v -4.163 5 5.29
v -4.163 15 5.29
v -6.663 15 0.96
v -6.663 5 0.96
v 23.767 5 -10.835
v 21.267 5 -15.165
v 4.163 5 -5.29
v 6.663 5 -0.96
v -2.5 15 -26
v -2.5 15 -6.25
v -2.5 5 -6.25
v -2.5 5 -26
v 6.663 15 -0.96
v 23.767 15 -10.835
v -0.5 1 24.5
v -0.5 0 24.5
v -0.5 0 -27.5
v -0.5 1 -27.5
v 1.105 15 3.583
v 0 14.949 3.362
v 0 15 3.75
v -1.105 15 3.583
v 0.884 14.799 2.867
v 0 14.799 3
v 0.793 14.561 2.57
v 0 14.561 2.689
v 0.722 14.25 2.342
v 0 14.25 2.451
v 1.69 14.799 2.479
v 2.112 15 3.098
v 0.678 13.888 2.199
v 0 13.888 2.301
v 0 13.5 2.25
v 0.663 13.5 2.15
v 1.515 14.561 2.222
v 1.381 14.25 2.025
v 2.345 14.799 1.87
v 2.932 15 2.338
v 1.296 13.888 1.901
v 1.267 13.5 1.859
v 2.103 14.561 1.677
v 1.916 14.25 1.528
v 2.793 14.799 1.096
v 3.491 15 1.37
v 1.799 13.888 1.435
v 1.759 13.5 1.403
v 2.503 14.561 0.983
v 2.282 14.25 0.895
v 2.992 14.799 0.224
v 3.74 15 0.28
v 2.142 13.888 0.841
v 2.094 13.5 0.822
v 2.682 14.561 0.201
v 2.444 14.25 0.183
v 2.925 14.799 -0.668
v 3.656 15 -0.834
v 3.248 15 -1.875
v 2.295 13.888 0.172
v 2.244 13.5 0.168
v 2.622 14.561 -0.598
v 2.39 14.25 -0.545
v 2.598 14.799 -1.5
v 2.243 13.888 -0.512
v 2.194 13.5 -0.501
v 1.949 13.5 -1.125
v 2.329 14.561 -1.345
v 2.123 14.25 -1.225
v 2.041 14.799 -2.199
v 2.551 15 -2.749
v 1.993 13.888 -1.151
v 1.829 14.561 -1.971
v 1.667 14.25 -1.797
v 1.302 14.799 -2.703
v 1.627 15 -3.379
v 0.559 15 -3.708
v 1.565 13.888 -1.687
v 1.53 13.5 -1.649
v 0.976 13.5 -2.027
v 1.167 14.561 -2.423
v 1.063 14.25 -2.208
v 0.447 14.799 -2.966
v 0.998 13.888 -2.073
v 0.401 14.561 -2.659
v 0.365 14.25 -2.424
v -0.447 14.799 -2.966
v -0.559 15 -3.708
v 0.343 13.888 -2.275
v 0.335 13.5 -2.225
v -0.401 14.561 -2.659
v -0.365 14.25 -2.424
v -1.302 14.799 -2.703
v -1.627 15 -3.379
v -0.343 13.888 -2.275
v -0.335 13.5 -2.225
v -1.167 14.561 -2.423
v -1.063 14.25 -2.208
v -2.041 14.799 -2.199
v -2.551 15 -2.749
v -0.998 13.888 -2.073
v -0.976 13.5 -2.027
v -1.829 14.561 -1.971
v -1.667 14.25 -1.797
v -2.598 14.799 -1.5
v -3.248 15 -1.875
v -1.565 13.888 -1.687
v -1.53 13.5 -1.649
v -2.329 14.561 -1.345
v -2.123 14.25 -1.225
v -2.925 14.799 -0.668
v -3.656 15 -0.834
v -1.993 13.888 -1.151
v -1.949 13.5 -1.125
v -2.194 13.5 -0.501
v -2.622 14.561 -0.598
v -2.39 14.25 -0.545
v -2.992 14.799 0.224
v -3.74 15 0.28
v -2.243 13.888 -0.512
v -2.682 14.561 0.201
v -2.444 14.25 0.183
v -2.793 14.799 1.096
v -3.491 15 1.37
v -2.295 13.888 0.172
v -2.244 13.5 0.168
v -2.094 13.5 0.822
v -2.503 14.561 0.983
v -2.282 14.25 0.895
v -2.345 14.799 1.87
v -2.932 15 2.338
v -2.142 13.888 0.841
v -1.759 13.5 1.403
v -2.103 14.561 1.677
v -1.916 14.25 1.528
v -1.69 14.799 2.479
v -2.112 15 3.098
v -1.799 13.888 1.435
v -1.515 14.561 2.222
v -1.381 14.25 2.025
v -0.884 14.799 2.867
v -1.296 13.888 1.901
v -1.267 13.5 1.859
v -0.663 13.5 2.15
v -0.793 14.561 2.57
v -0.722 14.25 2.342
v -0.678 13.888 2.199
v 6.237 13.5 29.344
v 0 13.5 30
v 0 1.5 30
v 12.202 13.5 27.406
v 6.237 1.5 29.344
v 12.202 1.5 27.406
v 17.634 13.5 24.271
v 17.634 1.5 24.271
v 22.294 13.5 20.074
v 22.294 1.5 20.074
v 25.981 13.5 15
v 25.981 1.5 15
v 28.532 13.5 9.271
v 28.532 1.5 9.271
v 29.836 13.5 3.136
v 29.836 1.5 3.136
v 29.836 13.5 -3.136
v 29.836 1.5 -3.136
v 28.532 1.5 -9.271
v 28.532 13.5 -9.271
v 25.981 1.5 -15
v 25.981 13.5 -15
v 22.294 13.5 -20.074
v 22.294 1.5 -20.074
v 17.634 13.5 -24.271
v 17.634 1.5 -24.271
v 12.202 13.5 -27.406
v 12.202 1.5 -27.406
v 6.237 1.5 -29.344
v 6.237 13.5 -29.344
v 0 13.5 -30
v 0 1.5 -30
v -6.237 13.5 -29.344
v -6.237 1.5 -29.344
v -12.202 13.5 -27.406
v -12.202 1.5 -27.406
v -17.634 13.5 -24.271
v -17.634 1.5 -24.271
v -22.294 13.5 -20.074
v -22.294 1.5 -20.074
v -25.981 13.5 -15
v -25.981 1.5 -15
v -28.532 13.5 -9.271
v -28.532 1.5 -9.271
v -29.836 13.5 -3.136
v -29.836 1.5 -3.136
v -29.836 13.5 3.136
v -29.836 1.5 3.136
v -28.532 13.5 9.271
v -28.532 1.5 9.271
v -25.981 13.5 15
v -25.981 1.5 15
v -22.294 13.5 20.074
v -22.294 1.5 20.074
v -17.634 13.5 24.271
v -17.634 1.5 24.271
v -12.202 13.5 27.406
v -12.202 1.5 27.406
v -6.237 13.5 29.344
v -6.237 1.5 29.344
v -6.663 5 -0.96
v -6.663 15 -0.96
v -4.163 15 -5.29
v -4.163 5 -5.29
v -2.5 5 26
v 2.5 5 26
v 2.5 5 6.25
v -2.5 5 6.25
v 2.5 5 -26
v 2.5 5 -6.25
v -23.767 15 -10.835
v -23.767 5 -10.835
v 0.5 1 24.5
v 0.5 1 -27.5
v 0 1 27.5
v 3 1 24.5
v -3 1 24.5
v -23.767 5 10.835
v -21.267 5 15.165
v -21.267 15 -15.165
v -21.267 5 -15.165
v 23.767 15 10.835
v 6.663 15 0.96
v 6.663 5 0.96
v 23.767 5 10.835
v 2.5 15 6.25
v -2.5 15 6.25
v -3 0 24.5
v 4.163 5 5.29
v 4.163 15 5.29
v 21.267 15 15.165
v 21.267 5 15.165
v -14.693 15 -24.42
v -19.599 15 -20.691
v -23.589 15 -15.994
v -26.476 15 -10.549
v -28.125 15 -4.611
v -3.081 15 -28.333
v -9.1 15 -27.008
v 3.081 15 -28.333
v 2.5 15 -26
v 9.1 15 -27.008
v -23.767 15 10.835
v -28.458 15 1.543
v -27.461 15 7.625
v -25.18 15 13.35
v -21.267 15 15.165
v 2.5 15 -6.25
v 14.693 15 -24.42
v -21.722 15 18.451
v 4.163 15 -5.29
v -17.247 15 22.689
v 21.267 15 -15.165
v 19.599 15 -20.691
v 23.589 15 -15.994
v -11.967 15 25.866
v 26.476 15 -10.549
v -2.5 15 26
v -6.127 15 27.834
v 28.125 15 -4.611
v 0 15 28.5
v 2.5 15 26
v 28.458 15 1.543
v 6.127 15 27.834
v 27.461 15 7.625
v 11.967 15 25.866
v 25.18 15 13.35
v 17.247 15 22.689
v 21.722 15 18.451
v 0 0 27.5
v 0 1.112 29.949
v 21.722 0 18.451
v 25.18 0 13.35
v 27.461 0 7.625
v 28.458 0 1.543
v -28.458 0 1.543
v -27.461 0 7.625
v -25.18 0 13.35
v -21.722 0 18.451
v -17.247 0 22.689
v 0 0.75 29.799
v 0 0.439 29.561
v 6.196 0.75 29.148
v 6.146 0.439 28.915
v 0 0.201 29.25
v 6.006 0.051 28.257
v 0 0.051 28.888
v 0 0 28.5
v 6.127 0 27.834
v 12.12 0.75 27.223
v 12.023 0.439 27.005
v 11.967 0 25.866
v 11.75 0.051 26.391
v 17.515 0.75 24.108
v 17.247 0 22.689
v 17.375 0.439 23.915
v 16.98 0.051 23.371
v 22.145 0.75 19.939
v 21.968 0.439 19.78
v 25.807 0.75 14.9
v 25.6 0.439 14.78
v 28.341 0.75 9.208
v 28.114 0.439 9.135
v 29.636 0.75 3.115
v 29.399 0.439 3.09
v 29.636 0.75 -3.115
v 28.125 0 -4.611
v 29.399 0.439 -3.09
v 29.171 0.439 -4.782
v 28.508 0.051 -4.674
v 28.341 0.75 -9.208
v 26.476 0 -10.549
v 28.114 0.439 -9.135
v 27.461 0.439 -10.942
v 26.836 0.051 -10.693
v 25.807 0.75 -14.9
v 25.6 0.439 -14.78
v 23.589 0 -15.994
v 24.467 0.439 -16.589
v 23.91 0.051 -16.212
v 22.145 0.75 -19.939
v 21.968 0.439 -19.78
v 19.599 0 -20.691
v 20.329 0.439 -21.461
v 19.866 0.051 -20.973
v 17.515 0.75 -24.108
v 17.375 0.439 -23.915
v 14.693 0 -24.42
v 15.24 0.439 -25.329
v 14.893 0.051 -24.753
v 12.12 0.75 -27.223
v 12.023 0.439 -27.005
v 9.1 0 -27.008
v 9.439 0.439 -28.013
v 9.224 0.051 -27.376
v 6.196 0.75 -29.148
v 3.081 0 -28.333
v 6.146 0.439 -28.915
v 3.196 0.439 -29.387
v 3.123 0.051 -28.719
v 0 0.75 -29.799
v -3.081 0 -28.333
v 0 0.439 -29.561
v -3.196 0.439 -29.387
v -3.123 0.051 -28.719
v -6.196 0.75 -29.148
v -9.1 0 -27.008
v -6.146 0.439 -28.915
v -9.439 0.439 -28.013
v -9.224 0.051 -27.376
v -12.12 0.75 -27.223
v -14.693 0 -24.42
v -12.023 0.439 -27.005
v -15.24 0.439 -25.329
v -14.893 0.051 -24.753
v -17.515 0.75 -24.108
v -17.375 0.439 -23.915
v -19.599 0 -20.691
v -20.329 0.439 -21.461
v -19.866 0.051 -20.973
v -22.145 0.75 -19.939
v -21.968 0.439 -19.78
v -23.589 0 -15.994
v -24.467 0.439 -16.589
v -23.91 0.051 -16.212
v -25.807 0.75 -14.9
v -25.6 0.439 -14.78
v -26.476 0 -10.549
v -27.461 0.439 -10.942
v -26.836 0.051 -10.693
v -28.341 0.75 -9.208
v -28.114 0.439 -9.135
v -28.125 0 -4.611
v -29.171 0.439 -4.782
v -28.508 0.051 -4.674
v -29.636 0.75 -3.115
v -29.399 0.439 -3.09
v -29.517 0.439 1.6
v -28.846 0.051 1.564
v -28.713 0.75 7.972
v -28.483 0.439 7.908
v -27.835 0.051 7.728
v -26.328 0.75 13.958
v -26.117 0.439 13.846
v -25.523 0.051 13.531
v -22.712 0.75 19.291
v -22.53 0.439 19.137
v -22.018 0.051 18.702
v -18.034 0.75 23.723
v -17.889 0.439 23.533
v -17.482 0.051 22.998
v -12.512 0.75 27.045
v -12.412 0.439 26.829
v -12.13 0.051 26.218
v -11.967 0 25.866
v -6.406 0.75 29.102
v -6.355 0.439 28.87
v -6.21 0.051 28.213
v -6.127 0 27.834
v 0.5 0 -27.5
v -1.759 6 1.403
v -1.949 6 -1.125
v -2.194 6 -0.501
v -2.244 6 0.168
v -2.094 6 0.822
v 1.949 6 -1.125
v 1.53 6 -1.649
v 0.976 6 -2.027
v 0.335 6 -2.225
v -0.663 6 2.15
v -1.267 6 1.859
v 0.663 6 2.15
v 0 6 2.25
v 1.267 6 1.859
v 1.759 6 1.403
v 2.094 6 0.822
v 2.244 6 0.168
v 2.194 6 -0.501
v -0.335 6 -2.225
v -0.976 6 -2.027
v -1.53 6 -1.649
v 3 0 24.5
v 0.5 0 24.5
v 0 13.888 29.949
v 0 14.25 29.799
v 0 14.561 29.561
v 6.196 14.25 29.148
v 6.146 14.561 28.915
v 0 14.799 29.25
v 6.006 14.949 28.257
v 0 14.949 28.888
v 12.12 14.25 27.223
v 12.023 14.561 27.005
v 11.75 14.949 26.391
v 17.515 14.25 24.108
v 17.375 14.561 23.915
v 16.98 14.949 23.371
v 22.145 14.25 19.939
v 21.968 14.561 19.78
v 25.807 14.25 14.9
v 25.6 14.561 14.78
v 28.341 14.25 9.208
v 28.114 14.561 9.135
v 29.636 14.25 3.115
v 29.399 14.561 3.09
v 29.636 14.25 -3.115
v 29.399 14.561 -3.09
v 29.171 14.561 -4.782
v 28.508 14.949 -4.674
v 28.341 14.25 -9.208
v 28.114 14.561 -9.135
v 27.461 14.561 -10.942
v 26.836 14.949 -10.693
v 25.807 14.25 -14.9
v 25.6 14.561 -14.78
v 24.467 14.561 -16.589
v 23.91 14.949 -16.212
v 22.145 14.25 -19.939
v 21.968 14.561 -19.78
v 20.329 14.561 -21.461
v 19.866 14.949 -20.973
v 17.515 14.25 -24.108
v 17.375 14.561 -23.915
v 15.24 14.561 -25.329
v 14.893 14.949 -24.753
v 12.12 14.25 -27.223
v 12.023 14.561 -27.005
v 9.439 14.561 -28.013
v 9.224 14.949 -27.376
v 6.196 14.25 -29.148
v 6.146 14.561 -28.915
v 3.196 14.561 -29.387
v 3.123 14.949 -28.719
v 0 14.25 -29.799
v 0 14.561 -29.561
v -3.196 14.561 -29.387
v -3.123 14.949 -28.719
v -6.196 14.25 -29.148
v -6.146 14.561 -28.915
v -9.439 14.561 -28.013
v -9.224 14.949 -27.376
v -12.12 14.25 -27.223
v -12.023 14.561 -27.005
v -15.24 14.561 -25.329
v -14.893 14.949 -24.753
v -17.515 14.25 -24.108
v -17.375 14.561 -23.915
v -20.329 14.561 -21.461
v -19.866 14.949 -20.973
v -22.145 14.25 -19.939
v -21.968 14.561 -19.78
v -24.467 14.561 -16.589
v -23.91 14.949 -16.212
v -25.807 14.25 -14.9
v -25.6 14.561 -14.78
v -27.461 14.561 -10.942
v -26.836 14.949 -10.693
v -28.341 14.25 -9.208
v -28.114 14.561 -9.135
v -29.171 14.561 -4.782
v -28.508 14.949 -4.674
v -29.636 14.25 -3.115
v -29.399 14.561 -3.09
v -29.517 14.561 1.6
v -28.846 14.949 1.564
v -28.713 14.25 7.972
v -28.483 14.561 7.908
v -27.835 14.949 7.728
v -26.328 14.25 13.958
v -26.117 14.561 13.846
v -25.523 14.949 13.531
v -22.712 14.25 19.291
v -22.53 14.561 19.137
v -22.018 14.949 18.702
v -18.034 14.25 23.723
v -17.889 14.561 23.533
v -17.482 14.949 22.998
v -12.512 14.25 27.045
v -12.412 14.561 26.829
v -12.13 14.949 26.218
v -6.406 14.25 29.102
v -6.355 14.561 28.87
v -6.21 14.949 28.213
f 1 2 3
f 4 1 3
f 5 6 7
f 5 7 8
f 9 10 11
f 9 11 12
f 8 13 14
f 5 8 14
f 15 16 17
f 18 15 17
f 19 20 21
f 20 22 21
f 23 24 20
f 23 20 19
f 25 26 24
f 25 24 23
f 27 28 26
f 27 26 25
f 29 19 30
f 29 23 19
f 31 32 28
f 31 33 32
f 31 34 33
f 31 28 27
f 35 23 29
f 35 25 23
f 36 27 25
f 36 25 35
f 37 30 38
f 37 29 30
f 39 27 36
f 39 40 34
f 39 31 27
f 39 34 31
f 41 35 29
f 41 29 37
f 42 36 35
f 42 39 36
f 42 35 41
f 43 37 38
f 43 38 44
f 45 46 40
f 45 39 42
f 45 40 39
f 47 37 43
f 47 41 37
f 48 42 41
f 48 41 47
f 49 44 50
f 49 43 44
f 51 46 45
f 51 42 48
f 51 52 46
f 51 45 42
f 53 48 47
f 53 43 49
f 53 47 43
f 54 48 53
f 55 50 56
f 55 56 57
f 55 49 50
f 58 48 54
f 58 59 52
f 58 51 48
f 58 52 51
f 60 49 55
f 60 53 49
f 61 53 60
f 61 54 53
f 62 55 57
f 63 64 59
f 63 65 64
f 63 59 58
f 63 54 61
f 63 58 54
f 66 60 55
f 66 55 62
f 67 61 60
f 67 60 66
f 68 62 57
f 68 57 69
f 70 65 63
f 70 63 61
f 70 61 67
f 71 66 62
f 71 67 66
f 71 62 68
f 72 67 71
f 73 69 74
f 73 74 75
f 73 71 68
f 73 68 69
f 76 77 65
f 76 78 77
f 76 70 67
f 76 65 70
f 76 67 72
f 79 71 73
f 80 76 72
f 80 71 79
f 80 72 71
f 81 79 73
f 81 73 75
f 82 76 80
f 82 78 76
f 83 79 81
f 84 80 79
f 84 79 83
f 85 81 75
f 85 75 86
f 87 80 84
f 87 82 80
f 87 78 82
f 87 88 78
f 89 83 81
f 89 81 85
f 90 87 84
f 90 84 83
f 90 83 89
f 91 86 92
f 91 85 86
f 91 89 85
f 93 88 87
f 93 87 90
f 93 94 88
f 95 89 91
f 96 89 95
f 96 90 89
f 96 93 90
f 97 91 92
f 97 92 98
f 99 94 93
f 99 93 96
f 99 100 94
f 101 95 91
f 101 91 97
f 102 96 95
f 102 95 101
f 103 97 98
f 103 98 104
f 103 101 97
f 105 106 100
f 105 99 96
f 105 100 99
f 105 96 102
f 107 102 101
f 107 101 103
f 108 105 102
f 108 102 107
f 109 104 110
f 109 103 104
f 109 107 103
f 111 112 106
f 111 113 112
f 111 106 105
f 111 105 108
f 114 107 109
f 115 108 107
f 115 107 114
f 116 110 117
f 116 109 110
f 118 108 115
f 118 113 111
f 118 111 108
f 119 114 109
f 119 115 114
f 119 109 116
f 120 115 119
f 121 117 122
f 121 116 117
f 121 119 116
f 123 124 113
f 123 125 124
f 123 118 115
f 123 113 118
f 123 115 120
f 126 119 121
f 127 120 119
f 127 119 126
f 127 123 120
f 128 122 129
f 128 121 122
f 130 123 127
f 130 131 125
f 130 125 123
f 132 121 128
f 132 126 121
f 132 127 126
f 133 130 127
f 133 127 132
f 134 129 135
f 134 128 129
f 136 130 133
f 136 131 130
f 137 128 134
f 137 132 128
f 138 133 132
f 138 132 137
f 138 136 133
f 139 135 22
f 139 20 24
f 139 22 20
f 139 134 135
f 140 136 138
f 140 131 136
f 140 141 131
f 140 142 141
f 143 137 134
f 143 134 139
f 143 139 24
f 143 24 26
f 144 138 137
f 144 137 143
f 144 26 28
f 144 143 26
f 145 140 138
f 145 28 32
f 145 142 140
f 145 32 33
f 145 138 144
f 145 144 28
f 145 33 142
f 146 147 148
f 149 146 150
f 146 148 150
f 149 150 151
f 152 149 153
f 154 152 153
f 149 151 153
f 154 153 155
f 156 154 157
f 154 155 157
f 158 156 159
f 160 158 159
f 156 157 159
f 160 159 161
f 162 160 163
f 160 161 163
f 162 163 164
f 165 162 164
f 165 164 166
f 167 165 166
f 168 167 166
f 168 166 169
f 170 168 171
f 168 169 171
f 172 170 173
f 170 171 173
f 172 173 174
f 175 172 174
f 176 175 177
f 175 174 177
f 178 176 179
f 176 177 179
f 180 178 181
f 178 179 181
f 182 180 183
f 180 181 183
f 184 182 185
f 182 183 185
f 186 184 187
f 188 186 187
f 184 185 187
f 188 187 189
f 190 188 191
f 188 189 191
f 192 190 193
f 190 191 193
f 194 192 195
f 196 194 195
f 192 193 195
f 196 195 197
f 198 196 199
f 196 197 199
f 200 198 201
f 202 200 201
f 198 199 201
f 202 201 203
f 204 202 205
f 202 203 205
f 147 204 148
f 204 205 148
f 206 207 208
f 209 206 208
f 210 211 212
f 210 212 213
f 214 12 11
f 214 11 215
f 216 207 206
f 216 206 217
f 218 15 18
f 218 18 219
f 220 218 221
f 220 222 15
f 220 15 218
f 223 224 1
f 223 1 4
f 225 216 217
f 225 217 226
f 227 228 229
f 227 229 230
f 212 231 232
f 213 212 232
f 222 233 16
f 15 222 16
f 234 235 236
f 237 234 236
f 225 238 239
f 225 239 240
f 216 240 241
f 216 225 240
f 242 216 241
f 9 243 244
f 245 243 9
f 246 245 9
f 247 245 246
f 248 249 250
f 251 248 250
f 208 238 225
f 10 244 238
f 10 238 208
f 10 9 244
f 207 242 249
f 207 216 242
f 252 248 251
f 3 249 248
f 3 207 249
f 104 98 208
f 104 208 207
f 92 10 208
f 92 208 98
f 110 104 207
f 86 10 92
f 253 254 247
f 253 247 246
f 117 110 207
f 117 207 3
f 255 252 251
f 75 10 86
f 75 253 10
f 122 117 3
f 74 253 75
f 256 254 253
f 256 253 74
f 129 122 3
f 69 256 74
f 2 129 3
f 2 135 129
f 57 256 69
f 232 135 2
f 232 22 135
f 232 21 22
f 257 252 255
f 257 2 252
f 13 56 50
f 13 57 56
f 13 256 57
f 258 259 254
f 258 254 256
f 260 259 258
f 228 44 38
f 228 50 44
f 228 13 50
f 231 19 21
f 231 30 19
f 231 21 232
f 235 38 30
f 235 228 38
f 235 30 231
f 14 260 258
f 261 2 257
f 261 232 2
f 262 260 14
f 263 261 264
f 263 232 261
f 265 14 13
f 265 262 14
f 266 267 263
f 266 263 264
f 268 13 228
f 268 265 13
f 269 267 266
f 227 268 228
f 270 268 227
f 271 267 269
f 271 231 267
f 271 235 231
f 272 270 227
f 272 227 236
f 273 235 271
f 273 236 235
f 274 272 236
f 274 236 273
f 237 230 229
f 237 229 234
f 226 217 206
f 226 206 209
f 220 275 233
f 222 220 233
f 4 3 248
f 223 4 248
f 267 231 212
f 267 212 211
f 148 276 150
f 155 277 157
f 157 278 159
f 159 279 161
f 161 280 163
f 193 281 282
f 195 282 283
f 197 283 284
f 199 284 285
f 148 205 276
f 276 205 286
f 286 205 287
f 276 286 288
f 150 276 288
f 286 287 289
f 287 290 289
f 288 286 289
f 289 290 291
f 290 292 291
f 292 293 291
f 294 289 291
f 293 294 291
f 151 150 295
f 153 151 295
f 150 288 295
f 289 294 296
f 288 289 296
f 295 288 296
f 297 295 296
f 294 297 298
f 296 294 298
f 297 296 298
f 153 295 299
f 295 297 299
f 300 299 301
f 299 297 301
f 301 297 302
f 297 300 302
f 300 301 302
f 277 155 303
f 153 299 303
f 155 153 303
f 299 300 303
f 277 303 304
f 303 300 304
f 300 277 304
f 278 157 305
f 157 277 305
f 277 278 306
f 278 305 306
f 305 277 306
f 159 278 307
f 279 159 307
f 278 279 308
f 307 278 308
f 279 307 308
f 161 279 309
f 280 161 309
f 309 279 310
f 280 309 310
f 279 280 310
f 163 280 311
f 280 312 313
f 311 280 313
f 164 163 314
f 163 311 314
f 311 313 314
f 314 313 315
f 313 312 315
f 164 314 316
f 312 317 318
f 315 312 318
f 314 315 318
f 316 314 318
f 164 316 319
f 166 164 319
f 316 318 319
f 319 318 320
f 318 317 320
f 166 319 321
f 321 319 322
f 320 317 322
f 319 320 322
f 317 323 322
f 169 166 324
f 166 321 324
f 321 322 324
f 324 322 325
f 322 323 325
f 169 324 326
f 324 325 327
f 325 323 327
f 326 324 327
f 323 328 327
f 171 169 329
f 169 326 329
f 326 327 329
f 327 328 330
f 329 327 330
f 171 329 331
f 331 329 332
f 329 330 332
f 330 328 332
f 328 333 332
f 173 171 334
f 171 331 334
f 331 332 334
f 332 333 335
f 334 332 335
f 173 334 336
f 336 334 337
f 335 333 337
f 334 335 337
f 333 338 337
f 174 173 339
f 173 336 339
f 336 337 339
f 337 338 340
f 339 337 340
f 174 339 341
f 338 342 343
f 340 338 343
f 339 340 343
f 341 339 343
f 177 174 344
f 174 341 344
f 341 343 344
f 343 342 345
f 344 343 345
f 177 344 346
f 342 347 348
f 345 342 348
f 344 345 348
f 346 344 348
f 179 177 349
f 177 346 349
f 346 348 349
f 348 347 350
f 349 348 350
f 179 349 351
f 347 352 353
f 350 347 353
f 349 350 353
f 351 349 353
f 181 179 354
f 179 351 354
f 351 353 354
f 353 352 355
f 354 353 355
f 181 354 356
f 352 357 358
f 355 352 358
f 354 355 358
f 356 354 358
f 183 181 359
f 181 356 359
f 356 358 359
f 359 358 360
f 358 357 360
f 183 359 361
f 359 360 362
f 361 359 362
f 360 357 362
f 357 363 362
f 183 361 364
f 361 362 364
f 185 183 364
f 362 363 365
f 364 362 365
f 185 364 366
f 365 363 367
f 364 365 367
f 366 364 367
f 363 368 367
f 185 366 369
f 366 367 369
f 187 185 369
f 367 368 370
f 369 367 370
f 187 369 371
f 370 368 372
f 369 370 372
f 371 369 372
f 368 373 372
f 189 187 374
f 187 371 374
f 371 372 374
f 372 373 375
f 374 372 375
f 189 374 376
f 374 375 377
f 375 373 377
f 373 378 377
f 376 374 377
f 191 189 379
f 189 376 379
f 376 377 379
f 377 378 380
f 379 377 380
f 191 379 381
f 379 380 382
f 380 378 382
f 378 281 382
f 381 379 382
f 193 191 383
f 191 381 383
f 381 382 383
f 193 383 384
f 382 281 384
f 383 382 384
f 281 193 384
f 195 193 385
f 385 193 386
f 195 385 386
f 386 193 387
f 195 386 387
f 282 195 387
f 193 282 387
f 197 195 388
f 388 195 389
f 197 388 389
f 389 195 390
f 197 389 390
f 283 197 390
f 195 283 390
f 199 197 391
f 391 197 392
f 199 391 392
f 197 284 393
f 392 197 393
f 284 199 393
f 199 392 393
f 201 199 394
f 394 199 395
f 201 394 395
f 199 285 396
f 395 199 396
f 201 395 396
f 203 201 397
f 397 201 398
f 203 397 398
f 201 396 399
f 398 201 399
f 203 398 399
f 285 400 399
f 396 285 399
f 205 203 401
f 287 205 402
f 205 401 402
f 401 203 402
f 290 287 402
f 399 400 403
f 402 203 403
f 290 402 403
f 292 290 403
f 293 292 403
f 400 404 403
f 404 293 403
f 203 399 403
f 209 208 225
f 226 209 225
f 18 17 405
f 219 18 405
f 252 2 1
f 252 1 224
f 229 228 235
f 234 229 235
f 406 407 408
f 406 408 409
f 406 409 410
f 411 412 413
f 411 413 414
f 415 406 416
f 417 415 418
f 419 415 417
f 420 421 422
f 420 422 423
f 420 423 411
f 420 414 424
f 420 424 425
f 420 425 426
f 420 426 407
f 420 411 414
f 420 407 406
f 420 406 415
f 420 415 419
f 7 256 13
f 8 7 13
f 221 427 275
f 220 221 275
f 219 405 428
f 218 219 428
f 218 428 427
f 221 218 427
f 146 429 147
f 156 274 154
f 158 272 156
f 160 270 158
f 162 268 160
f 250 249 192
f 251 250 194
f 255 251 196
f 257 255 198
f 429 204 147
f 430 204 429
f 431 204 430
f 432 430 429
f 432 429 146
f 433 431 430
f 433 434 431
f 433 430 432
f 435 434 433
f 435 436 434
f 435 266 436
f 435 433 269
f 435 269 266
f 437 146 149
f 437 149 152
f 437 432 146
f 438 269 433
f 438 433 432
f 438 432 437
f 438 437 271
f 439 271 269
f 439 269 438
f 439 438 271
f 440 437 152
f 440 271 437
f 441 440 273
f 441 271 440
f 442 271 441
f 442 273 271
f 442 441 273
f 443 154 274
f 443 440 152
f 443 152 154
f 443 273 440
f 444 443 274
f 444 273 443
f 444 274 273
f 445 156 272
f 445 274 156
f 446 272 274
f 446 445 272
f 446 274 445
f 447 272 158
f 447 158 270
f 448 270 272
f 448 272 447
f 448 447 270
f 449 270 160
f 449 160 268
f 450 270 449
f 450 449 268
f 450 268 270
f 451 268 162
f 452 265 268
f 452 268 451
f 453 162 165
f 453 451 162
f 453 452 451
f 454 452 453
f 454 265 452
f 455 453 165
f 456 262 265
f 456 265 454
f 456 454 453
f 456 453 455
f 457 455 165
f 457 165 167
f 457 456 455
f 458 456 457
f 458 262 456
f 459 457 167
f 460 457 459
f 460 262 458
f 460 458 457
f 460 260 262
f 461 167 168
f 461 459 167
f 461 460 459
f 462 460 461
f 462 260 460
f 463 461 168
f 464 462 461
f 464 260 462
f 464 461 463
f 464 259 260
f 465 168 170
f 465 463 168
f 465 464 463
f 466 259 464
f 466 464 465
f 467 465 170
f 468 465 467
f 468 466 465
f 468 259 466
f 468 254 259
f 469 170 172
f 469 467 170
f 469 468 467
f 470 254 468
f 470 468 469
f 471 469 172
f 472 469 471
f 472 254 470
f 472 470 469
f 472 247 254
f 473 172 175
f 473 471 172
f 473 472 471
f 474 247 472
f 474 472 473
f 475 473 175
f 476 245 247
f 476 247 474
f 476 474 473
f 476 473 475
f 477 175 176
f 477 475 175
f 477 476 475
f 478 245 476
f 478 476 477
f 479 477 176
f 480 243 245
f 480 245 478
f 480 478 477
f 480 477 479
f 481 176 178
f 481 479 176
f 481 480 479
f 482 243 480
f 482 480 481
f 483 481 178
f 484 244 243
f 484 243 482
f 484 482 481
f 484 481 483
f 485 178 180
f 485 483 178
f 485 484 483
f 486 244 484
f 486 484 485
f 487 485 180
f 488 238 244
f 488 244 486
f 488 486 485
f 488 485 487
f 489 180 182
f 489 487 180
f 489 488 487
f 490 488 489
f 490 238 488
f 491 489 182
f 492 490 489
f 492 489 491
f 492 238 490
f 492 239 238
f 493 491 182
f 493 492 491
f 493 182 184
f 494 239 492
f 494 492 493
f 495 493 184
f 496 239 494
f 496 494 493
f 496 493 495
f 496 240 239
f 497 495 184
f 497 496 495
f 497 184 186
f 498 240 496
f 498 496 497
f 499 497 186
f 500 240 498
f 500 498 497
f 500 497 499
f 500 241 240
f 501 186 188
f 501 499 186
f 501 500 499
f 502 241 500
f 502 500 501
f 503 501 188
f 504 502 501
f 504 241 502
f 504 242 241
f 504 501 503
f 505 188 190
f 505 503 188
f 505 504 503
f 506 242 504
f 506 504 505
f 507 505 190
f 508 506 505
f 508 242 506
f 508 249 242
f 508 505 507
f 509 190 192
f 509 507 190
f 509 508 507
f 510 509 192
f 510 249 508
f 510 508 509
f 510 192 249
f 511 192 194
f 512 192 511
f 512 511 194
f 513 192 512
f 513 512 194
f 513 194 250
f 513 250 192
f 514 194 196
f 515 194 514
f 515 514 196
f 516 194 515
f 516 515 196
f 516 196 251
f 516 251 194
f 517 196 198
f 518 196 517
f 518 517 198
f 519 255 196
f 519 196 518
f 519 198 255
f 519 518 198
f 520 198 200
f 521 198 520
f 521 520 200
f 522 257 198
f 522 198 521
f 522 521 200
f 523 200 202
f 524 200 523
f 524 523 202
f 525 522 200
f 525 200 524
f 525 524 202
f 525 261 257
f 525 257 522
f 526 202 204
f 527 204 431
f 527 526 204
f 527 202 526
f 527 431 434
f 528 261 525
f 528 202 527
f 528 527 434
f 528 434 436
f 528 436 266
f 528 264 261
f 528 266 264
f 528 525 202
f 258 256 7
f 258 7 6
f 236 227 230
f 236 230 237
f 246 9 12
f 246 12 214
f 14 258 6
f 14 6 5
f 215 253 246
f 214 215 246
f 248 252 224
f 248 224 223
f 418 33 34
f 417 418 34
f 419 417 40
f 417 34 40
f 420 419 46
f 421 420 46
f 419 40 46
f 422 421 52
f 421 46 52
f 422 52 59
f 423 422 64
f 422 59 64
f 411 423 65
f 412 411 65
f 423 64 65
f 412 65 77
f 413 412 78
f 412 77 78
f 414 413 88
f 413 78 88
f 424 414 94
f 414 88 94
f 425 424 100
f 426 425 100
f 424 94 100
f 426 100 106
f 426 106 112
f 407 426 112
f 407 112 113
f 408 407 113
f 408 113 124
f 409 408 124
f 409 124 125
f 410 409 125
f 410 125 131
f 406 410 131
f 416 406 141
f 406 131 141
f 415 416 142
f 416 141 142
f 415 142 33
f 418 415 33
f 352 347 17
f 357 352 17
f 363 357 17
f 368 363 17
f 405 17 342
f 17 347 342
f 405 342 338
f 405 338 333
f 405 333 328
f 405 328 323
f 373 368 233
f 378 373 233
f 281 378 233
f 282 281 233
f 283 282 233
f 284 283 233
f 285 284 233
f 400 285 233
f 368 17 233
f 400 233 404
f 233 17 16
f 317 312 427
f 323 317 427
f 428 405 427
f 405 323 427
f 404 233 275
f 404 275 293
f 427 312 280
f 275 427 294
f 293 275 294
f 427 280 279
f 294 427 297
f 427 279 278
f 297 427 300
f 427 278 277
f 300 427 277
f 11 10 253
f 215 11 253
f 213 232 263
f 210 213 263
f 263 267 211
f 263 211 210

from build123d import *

# Parameters (mm, degrees)
SKETCH2_R           = 30
BOSS_EXTRUDE1_DEPTH = 15
SKETCH3_R           = 2.25
CUT_EXTRUDE1_DEPTH  = 9
FILLET1_R           = 1.5
CUT_EXTRUDE2_DEPTH  = 1
SKETCH5_W           = 5
SKETCH5_H           = 19.75
CUT_EXTRUDE3_DEPTH  = 10
CIRPATTERN1_COUNT   = 6


with BuildPart() as part:
    # Sketch2 → Boss-Extrude1 (new body)
    with BuildSketch(Plane(origin=(0, 0, 0), x_dir=(1, 0, 0), z_dir=(0, 1, 0))):
        with Locations(Location((0, 0, 0), (0, 0, 270))):
            Circle(SKETCH2_R)
    extrude(amount=BOSS_EXTRUDE1_DEPTH)

    # Sketch3 → Cut-Extrude1 (cut)
    with BuildSketch(Plane(origin=(0, 15, 0), x_dir=(1, 0, 0), z_dir=(0, 1, 0))):
        with Locations(Location((0, 0, 0), (0, 0, 270))):
            Circle(SKETCH3_R)
    extrude(amount=-CUT_EXTRUDE1_DEPTH, mode=Mode.SUBTRACT)

    # Fillet1
    fillet1_edges = [part.edges().sort_by_distance(p)[0] for p in [
        (0, 0, -30),
        (0, 15, -30),
        (0, 15, -2.25),
    ]]
    fillet(fillet1_edges, radius=FILLET1_R)

    # Sketch4 → Cut-Extrude2 (cut)
    with BuildSketch(Plane.XZ):
        Polygon((-0.5, 24.5), (-0.5, -27.5), (0.5, -27.5), (0.5, 24.5), (3, 24.5), (0, 27.5), (-3, 24.5), align=None)
    extrude(amount=-CUT_EXTRUDE2_DEPTH, mode=Mode.SUBTRACT)

    # Sketch5 → Cut-Extrude3 (cut)
    with BuildSketch(Plane(origin=(0, 15, 0), x_dir=(1, 0, 0), z_dir=(0, 1, 0))):
        with Locations((0, 16.125)):
            Rectangle(SKETCH5_W, SKETCH5_H)
    cut_extrude3 = extrude(amount=-CUT_EXTRUDE3_DEPTH, mode=Mode.SUBTRACT)

    # CirPattern1: Cut-Extrude3 ×6 about axis
    cirpattern1_axis = Axis((0, 0, 0), (0, 1, 0))
    for i in range(1, CIRPATTERN1_COUNT):
        add(cut_extrude3.rotate(cirpattern1_axis, i * 360 / CIRPATTERN1_COUNT), mode=Mode.SUBTRACT)


solid = part.part
